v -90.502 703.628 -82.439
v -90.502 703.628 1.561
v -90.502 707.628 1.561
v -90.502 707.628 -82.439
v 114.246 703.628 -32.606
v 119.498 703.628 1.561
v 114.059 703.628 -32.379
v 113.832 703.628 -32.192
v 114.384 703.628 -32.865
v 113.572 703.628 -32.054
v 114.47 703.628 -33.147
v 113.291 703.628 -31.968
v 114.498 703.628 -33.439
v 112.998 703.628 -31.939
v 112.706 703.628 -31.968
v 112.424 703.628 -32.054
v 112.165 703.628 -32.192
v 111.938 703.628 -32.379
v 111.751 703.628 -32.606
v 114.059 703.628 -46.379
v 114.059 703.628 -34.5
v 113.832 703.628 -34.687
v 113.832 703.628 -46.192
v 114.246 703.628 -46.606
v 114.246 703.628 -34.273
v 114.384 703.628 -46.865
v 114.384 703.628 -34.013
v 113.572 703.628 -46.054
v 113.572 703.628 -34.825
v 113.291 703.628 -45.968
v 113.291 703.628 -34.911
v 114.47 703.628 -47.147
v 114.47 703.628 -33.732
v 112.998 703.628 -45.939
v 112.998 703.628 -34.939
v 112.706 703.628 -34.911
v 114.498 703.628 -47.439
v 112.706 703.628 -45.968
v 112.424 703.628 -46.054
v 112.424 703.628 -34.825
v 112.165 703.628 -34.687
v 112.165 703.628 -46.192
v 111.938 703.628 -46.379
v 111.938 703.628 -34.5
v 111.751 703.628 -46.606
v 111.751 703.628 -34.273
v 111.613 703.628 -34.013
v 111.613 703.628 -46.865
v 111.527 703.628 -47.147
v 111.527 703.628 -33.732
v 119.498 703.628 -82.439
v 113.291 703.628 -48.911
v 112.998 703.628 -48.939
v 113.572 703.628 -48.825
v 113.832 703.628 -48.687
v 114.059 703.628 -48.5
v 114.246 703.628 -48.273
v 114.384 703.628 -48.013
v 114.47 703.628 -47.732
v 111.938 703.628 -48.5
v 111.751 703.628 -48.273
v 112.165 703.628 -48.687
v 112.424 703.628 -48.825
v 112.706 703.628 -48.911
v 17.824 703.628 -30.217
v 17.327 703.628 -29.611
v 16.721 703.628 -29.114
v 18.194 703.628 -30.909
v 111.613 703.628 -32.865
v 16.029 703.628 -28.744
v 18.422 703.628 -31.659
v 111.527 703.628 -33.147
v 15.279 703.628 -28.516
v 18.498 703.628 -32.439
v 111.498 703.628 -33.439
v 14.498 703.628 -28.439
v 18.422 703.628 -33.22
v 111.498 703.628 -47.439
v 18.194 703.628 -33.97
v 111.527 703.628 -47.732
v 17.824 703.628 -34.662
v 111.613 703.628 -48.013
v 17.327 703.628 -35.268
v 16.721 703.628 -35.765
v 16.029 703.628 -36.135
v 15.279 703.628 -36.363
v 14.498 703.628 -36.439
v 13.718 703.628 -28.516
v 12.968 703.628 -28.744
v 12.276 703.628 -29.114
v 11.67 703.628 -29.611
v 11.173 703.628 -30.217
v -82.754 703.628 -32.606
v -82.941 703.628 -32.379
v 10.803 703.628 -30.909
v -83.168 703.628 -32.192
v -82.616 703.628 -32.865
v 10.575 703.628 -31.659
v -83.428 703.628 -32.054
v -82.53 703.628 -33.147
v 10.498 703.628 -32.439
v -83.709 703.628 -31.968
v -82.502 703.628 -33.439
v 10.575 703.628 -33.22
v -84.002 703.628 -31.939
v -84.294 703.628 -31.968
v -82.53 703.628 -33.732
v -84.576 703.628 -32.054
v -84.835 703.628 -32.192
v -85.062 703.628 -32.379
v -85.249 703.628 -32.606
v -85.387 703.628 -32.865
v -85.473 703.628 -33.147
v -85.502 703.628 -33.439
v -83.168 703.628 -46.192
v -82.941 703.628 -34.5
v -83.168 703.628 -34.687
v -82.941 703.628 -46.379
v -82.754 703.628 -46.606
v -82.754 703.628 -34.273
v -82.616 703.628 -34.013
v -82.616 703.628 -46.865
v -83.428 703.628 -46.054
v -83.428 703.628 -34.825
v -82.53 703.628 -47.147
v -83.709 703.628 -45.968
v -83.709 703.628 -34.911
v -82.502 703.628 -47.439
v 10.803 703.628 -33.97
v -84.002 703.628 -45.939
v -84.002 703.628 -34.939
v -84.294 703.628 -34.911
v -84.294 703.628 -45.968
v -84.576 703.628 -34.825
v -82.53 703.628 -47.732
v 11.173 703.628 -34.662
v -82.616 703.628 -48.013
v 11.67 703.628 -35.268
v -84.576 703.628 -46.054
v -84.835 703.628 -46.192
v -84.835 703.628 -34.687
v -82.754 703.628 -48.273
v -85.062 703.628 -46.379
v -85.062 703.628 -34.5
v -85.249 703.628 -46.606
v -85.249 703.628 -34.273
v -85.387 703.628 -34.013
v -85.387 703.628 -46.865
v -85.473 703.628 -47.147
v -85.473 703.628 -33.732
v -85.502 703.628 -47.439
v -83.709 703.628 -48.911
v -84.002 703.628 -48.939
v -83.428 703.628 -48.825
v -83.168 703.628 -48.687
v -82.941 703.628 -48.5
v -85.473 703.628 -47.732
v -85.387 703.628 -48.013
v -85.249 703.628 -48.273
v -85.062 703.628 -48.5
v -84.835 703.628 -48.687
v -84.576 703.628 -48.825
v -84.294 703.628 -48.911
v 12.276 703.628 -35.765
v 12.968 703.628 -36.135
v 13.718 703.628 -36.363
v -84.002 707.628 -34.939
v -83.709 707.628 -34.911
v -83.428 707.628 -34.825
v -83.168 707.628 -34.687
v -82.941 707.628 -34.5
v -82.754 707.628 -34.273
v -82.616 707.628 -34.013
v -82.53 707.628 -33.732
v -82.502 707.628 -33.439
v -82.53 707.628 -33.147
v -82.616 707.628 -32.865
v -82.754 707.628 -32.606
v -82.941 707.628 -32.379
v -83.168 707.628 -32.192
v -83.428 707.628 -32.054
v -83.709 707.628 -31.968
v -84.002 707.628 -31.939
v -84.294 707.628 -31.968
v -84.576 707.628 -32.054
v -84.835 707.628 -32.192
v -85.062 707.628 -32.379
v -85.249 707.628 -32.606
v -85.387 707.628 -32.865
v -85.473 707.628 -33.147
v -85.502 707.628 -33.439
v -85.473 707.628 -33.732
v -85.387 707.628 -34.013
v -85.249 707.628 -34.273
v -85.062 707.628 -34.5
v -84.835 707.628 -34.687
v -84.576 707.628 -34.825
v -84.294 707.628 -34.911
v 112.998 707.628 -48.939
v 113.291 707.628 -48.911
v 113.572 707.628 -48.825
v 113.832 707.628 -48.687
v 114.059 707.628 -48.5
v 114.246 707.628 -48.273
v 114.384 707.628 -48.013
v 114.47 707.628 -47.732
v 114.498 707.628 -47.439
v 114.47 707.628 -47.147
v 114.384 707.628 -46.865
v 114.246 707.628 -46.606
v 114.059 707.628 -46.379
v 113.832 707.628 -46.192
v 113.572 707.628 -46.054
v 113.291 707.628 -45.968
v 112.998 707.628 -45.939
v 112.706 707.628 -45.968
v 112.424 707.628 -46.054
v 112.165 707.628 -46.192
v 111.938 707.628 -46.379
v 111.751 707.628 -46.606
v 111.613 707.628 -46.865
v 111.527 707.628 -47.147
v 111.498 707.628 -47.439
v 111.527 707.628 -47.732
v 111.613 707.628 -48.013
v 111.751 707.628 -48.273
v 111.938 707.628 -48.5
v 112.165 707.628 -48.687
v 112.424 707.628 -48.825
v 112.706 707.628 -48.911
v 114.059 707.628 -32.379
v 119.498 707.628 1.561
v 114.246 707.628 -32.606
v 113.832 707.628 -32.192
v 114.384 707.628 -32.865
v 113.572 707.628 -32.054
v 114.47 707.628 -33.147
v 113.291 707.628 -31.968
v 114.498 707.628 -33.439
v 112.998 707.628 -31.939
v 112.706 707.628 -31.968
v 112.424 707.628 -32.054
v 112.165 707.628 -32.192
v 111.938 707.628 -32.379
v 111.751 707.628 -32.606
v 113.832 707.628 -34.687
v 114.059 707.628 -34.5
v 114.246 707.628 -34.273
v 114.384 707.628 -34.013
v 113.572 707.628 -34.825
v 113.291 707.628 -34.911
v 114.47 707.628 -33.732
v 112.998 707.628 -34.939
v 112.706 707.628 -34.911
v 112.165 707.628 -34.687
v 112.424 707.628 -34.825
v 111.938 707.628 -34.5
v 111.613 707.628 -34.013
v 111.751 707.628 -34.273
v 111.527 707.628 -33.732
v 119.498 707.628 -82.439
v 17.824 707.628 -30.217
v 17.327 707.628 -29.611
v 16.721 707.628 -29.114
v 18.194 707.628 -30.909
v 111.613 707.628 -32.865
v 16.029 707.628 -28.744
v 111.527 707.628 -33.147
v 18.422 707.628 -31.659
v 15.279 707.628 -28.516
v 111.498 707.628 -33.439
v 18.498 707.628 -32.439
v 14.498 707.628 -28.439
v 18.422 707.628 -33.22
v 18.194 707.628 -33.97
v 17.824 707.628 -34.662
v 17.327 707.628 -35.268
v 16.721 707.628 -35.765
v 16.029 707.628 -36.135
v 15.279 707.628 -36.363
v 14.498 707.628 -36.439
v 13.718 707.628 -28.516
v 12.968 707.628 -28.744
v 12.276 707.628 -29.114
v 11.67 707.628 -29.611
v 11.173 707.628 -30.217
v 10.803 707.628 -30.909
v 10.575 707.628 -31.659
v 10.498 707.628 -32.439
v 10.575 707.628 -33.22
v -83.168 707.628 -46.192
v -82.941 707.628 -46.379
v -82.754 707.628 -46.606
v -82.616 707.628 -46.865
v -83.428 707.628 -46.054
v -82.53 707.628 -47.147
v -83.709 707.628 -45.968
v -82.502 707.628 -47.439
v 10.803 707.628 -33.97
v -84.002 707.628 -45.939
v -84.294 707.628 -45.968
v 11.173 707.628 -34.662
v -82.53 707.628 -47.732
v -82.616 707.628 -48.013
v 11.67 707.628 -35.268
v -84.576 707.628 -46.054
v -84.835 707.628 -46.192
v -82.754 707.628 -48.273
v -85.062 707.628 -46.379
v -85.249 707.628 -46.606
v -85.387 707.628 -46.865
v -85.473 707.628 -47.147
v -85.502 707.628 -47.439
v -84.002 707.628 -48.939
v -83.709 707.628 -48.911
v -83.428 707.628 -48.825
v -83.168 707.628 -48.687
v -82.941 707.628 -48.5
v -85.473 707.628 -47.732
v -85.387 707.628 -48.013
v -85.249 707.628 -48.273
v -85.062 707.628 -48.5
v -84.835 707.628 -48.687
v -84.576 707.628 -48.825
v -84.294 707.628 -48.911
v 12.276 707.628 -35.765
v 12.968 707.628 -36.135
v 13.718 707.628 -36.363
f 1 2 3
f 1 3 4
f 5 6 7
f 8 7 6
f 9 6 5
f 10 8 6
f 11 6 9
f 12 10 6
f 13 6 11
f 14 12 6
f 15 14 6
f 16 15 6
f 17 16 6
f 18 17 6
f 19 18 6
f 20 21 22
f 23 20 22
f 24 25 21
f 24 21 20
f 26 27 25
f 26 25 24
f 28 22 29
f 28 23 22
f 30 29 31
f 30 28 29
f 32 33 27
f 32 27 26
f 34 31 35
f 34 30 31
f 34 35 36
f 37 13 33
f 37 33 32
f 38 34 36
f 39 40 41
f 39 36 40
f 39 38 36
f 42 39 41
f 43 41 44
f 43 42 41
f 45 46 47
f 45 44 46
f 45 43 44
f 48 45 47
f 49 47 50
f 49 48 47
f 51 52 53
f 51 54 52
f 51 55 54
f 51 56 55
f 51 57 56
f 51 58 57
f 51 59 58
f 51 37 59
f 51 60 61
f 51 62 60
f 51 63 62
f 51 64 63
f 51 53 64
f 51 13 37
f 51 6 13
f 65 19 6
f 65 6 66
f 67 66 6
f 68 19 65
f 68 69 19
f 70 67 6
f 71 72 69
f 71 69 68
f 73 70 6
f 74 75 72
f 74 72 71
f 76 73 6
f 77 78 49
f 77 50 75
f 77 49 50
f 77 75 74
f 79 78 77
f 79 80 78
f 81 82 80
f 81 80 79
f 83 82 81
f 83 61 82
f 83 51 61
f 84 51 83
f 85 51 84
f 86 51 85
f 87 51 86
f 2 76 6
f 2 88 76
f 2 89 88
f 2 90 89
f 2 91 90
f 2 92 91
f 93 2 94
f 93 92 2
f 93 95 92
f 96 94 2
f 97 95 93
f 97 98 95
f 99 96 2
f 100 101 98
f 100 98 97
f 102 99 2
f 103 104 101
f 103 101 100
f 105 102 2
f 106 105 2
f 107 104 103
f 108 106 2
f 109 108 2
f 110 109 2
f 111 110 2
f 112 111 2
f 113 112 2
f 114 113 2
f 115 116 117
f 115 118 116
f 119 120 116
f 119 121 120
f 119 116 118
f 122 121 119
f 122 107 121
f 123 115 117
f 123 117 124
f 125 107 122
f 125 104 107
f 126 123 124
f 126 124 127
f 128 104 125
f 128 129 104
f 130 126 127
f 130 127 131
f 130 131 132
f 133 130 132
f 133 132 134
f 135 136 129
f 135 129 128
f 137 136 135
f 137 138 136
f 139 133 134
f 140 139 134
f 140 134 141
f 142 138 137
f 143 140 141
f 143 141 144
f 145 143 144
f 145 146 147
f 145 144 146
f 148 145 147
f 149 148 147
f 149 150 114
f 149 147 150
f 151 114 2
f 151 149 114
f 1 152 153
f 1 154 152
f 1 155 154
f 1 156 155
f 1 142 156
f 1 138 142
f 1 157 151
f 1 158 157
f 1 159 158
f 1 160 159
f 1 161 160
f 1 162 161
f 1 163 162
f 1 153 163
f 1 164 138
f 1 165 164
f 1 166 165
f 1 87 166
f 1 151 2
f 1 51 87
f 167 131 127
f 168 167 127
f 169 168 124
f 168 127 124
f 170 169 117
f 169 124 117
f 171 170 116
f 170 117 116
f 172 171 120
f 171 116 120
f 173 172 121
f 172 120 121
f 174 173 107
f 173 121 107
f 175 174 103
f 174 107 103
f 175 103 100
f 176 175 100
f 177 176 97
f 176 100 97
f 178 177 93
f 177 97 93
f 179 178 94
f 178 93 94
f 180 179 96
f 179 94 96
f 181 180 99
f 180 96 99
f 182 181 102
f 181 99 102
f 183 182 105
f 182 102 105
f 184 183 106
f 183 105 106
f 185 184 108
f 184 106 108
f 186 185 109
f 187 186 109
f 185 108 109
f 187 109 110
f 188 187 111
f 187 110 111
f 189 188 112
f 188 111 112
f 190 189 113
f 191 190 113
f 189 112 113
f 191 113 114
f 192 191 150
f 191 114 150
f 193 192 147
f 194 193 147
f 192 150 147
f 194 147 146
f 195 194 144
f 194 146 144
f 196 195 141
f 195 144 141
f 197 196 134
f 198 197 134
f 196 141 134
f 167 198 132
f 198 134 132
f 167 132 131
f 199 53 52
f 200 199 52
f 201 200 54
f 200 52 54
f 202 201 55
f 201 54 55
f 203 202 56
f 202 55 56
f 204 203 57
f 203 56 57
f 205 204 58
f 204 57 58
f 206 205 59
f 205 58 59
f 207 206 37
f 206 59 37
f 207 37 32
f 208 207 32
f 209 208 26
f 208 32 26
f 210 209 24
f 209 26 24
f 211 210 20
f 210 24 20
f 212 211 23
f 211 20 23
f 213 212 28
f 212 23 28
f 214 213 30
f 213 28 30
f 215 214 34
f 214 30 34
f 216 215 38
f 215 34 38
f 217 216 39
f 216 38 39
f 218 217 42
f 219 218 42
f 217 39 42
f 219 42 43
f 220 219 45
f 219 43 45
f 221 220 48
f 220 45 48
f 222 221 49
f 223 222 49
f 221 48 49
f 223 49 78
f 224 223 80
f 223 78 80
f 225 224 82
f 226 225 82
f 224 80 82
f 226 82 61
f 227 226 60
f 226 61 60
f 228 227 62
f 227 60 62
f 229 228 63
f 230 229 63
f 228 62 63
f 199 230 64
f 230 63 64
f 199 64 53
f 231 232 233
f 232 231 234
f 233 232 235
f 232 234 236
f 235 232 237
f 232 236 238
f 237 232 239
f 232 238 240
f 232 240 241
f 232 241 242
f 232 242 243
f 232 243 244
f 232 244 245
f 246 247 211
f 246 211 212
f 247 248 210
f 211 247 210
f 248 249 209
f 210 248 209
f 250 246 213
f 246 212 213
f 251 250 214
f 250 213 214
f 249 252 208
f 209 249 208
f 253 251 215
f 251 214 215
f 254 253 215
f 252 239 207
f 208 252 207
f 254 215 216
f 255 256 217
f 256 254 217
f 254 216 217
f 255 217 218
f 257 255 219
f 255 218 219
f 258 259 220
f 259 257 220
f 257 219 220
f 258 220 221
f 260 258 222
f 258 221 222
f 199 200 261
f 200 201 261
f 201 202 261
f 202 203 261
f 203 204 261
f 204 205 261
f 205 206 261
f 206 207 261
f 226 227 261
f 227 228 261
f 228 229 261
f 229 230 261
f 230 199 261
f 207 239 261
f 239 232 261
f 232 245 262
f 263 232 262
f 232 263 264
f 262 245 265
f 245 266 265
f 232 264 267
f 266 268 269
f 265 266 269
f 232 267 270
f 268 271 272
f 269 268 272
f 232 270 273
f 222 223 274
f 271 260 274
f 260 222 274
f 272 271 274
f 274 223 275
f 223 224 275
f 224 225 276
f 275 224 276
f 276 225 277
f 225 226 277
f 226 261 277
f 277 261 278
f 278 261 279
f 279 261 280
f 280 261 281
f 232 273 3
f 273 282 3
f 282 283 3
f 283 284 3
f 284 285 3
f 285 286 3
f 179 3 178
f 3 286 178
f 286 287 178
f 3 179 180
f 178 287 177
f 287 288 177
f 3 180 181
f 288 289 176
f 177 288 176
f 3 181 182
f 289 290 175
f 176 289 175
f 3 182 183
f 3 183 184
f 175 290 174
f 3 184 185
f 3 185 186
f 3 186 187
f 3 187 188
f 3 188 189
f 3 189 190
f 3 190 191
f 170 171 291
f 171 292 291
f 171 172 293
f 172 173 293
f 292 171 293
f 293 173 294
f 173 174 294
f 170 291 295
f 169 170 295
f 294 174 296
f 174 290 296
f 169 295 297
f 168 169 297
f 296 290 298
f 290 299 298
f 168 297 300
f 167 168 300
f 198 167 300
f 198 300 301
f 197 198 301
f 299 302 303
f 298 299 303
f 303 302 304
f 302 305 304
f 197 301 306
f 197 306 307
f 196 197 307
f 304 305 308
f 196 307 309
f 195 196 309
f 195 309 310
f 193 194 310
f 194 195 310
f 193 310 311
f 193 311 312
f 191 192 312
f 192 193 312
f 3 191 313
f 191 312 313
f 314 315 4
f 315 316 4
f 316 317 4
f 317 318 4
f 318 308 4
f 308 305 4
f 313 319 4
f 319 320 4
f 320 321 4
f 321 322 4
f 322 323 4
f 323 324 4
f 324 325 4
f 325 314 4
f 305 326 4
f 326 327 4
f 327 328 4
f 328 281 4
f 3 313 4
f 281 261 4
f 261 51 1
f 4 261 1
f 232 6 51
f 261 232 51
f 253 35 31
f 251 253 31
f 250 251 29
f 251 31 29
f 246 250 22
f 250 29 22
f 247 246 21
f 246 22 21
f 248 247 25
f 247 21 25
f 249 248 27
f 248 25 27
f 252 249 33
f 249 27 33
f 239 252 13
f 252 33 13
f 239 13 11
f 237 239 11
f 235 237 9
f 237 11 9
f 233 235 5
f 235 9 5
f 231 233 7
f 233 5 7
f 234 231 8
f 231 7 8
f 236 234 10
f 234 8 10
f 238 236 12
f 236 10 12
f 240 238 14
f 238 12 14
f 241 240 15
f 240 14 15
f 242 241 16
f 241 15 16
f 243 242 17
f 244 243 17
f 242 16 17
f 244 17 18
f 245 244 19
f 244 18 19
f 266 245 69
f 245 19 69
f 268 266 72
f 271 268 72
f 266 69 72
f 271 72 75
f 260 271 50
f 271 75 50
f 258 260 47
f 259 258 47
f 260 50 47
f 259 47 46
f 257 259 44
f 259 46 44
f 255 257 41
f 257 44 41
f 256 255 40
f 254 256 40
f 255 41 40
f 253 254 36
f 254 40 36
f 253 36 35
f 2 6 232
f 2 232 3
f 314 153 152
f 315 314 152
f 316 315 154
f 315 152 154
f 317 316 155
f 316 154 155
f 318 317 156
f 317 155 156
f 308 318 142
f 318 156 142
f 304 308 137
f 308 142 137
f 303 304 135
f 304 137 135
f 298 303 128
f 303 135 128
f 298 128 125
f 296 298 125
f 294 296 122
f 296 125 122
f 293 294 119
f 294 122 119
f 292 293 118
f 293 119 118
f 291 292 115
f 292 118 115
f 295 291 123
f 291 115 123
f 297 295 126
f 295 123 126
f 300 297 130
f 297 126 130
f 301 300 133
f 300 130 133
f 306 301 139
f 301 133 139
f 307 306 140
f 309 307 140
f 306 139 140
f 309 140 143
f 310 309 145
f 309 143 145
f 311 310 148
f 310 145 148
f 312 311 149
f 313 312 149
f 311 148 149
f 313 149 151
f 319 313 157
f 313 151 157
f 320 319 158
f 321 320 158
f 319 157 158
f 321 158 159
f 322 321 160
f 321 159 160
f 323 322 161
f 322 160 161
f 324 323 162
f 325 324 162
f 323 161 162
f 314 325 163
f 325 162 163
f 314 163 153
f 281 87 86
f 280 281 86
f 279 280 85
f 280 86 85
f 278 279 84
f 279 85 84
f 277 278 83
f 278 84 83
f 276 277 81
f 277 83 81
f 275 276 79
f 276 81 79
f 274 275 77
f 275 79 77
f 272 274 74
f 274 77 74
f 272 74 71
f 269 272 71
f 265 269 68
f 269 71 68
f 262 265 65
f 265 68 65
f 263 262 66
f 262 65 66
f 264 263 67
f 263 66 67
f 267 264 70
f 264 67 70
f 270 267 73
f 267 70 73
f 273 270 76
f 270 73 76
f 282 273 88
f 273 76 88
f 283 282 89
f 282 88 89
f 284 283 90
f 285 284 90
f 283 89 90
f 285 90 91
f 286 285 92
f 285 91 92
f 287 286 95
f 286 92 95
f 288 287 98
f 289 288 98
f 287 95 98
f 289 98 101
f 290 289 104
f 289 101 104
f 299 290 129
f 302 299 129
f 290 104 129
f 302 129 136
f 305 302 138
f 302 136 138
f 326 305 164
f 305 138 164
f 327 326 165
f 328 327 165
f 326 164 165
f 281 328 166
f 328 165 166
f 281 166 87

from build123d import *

# Parameters (mm, degrees)
CROQUIS2_W              = 210
CROQUIS2_H              = 84
CROQUIS2_R              = 4
CROQUIS2_R_2            = 1.5
SALIENTE_EXTRUIR1_DEPTH = 4


with BuildPart() as part:
    # Croquis2 → Saliente-Extruir1 (new body)
    with BuildSketch(Plane(origin=(-13.73192422, 703.628389678, -26.324312824), x_dir=(-1, 0, 0), z_dir=(0, -1, 0))):
        with Locations((-28.230309316, 14.115154658)):
            Rectangle(CROQUIS2_W, CROQUIS2_H)
        with Locations(Location((-28.230309316, 6.115154658, 0), (0, 0, 90))):
            Circle(CROQUIS2_R, mode=Mode.SUBTRACT)
        with Locations(Location((-126.730309316, 7.115154658, 0), (0, 0, 90))):
            Circle(CROQUIS2_R_2, mode=Mode.SUBTRACT)
        with Locations(Location((-126.730309316, 21.115154658, 0), (0, 0, 90))):
            Circle(CROQUIS2_R_2, mode=Mode.SUBTRACT)
        with Locations(Location((70.269690684, 21.115154658, 0), (0, 0, 90))):
            Circle(CROQUIS2_R_2, mode=Mode.SUBTRACT)
        with Locations(Location((70.269690684, 7.115154658, 0), (0, 0, 90))):
            Circle(CROQUIS2_R_2, mode=Mode.SUBTRACT)
    extrude(amount=-SALIENTE_EXTRUIR1_DEPTH)


solid = part.part
